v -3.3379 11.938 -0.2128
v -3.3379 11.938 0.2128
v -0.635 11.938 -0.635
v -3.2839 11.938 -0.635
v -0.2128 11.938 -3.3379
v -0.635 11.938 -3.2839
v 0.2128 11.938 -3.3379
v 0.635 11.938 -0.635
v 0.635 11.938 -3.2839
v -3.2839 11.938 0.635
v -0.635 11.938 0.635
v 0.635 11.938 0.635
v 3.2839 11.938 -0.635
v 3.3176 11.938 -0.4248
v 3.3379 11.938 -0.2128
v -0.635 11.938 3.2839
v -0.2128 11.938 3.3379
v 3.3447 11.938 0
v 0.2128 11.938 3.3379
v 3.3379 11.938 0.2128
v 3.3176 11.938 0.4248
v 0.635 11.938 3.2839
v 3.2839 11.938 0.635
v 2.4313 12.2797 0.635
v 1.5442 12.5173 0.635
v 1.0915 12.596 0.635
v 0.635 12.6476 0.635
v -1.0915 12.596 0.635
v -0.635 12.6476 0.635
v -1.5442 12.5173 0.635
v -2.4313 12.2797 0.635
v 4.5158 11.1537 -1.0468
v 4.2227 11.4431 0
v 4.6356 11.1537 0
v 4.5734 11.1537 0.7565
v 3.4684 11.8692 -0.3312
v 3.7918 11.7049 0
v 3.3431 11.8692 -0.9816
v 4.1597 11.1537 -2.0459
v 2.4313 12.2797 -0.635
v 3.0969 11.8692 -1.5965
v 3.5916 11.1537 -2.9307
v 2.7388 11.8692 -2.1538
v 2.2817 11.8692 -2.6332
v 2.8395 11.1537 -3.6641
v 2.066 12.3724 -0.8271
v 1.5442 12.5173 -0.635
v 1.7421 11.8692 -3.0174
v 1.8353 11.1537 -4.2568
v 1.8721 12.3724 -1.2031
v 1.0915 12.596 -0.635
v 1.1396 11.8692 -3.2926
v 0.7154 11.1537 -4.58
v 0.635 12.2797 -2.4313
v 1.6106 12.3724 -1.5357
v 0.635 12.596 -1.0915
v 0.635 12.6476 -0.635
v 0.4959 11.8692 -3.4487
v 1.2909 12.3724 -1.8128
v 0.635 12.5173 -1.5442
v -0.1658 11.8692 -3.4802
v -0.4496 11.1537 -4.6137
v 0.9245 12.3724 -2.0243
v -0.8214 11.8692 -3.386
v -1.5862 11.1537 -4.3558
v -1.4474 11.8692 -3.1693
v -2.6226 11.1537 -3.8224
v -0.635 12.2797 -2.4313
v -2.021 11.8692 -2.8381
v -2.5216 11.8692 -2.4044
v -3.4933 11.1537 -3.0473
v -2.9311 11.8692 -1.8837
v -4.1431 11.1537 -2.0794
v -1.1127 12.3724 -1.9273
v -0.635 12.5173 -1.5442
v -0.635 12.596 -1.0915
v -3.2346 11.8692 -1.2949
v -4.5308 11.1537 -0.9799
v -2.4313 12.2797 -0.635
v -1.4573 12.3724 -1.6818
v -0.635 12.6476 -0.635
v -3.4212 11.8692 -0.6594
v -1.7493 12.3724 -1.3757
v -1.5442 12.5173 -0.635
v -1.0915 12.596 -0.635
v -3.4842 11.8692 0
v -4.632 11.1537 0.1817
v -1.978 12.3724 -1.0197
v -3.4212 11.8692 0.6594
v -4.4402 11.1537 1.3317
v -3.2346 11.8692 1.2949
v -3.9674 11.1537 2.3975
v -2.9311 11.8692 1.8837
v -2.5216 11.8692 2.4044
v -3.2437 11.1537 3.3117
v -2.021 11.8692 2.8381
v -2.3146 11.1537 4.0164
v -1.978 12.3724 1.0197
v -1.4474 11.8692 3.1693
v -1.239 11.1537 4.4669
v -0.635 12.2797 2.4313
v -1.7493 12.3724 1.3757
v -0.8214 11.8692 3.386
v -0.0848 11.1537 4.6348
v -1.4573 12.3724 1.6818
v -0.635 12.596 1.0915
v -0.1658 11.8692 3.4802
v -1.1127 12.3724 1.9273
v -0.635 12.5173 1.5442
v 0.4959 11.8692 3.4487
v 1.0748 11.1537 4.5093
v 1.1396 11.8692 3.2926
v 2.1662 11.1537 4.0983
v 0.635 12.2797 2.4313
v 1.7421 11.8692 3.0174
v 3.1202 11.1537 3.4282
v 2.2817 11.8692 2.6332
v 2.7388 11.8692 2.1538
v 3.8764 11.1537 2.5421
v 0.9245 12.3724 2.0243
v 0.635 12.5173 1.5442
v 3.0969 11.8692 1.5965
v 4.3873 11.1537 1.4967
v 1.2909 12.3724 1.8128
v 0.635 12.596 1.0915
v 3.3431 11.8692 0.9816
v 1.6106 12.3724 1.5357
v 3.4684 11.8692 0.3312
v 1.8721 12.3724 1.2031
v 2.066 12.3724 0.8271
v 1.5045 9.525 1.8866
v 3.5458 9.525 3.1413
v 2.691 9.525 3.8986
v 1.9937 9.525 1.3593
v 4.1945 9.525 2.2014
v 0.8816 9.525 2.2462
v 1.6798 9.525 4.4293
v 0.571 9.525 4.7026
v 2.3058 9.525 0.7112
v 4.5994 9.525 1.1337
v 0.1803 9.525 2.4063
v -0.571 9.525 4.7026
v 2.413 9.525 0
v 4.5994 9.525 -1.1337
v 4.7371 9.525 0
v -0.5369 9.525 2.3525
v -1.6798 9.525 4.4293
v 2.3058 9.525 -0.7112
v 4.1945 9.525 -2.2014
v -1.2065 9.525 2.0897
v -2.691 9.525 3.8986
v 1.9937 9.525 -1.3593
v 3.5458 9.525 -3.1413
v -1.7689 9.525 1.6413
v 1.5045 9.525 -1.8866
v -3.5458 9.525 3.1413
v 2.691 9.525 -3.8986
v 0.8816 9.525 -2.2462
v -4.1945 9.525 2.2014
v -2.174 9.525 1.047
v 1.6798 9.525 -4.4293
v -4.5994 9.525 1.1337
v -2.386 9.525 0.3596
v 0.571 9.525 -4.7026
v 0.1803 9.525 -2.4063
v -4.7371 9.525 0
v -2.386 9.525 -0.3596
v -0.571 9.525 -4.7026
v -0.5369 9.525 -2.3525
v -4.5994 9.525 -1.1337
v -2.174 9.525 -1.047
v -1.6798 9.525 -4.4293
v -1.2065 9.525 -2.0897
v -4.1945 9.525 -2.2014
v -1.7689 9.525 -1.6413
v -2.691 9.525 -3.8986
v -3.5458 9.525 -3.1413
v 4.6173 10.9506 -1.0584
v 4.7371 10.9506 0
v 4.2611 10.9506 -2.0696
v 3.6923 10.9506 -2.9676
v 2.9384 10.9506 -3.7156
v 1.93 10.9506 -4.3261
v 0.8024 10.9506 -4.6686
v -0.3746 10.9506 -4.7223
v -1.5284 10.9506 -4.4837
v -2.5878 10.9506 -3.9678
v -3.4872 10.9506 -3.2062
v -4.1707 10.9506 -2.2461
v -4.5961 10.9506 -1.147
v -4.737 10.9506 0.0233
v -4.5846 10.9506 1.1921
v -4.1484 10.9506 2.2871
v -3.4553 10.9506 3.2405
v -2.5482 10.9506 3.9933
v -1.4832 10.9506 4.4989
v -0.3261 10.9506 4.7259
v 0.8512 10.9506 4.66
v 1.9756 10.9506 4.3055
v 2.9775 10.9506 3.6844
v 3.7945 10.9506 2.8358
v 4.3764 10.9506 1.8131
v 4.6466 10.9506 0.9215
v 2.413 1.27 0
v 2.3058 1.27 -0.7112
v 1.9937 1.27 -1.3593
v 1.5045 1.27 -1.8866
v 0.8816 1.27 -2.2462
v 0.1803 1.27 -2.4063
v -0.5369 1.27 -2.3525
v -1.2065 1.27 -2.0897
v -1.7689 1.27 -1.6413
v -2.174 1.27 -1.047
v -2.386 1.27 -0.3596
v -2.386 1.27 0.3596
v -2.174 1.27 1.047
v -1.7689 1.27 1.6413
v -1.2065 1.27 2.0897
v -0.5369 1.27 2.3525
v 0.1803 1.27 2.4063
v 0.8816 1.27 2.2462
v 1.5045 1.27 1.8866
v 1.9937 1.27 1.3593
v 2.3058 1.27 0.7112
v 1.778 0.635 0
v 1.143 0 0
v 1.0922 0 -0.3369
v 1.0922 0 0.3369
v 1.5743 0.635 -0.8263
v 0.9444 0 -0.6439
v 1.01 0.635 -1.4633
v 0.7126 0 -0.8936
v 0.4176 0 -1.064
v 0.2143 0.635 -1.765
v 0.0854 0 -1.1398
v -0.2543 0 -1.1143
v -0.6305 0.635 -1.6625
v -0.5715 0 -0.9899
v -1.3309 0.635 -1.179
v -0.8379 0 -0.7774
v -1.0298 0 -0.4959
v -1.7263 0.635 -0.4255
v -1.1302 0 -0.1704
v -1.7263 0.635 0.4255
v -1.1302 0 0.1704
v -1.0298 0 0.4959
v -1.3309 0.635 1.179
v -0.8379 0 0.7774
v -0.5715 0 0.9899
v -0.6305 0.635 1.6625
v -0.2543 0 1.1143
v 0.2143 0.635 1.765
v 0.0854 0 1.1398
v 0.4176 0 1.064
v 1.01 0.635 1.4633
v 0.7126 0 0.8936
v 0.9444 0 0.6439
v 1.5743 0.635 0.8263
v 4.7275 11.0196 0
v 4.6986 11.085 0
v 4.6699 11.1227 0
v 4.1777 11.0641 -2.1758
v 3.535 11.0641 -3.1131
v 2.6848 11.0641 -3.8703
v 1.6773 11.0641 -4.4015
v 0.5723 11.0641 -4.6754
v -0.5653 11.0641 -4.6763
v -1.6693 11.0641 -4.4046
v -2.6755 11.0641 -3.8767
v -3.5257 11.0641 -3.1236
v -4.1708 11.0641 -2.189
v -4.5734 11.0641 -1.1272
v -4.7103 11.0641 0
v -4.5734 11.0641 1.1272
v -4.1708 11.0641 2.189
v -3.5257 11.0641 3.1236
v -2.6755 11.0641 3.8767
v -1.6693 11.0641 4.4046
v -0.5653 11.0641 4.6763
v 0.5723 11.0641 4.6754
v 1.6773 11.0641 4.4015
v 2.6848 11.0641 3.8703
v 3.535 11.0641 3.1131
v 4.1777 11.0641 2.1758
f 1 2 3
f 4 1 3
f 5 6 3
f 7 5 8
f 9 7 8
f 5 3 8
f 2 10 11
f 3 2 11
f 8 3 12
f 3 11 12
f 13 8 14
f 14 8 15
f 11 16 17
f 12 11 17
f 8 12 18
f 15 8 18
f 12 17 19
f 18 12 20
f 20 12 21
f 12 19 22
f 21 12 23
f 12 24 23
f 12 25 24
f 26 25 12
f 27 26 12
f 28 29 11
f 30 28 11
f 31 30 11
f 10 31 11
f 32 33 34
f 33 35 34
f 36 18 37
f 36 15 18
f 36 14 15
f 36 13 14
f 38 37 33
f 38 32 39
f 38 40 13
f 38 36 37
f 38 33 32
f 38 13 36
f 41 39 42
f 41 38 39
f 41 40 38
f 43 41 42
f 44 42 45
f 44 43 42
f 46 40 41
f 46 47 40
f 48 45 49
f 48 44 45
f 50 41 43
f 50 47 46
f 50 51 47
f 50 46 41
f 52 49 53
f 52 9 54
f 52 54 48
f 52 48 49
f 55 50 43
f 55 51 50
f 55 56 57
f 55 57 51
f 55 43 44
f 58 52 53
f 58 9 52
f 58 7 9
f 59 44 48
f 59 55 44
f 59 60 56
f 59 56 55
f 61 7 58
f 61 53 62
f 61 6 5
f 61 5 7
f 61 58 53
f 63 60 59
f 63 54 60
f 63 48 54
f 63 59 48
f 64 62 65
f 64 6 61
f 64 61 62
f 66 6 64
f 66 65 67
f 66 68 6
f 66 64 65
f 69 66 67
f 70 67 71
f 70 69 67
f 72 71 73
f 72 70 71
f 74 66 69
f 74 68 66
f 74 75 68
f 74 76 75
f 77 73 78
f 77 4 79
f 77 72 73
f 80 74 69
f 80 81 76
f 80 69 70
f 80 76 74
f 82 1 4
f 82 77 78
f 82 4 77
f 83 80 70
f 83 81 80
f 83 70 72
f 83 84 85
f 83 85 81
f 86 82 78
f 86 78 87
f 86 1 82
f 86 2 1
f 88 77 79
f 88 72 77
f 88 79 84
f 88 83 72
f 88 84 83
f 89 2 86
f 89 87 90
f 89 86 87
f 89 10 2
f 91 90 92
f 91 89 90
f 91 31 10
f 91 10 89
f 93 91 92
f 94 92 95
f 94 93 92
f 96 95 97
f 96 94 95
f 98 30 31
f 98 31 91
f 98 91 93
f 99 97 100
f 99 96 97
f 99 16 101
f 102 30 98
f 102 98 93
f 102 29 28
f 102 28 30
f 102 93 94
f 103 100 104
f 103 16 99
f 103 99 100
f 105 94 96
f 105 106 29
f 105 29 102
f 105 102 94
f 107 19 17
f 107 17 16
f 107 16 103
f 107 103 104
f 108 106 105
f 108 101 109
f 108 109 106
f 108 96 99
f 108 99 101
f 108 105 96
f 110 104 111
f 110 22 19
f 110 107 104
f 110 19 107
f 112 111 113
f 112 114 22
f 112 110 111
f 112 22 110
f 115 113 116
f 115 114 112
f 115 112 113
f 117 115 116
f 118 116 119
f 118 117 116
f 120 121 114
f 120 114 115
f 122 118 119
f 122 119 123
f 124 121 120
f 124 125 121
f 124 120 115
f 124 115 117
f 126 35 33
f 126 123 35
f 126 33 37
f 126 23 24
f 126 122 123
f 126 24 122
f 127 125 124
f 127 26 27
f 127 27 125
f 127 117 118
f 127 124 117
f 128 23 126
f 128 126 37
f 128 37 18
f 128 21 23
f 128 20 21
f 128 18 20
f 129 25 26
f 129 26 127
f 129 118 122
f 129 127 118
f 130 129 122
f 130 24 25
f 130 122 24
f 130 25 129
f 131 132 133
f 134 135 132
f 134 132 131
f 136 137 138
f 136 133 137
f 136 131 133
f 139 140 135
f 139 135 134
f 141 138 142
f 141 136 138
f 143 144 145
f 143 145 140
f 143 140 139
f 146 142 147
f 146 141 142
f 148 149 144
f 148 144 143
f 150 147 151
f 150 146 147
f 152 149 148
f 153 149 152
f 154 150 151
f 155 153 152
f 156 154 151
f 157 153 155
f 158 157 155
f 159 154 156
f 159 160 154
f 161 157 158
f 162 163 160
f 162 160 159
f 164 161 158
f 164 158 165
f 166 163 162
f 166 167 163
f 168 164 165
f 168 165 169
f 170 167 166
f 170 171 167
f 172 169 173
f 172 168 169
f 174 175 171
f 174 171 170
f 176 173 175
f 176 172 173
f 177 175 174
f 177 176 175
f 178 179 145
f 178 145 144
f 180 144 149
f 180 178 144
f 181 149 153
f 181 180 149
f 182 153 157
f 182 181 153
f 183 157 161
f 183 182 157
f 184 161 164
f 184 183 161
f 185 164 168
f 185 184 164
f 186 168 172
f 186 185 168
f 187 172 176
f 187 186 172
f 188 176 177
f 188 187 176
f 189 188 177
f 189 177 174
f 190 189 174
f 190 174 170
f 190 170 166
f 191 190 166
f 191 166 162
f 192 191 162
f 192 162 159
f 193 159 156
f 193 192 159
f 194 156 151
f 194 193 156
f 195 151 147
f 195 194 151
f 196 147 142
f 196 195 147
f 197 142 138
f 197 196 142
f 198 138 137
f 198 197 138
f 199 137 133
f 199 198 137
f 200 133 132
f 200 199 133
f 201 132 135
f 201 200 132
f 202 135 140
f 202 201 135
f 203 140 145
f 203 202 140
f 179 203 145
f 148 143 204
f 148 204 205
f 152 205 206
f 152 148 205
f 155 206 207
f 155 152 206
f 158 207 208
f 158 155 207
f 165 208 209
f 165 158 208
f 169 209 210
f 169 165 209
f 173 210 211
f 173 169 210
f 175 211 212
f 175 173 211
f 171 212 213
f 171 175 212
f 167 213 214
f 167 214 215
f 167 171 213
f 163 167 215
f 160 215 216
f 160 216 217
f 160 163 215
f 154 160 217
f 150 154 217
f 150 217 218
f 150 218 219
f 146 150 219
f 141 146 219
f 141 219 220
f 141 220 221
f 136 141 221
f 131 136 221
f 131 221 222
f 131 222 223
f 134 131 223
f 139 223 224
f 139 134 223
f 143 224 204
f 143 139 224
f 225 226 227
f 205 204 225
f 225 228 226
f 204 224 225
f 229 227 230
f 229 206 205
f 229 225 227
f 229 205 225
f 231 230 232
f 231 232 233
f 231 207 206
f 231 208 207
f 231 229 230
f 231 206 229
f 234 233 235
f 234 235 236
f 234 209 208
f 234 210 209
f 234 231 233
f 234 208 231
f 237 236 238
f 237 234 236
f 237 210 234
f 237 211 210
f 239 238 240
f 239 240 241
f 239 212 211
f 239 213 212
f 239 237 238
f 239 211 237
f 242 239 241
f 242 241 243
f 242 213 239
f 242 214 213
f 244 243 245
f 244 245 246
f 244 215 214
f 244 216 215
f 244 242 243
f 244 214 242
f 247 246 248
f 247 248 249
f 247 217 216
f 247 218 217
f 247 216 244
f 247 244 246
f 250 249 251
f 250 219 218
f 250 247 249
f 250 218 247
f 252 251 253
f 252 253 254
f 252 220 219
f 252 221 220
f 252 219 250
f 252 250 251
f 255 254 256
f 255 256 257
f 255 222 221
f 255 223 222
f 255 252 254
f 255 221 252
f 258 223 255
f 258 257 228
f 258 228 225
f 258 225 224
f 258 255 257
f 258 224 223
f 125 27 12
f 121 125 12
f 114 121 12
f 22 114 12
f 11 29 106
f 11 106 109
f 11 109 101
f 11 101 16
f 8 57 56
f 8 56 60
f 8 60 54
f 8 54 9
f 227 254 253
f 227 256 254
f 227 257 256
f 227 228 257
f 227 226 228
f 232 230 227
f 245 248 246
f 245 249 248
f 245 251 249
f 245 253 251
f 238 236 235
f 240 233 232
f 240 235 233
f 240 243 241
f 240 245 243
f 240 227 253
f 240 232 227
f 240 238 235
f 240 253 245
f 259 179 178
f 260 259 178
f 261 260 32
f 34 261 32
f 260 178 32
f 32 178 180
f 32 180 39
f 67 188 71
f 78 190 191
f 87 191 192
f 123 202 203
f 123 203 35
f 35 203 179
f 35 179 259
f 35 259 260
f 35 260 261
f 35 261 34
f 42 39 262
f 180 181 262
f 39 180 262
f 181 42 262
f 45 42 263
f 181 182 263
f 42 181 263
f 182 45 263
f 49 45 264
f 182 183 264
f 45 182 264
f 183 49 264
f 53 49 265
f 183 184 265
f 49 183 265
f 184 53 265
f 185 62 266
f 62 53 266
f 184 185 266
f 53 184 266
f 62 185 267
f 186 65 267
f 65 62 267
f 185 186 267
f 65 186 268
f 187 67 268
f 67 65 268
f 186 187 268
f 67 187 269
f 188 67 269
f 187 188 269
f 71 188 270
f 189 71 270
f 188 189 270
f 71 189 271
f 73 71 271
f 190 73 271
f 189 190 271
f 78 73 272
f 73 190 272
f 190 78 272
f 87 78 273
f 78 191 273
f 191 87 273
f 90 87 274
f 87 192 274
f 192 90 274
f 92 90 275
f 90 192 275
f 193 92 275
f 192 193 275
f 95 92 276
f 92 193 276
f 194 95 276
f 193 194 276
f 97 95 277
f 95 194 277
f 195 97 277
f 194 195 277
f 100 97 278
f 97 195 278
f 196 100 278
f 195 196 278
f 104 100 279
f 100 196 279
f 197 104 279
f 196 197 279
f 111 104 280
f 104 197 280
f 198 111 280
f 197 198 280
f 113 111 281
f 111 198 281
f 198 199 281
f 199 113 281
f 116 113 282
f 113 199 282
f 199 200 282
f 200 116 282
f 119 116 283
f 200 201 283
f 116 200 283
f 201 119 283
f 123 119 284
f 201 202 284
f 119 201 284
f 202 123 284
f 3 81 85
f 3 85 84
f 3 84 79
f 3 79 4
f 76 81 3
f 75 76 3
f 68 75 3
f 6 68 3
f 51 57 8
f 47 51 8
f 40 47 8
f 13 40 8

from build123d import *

# Parameters (mm, degrees)
CUT_EXTRUDE1_DEPTH = 0.635
CIRPATTERN1_COUNT  = 4
CHAMFER1_SIZE      = 1.27
FILLET1_R          = 0.254


with BuildPart() as part:
    # Sketch1 → Revolve1 (revolve)
    with BuildSketch(Plane.XY):
        with BuildLine():
            Line((0, 0), (2.413, 0))
            Line((2.413, 0), (2.413, 9.525))
            Line((2.413, 9.525), (4.7371, 9.525))
            Line((4.7371, 9.525), (4.7371, 11.076185676))
            ThreePointArc((4.7371, 11.076185676), (2.503841517, 12.282774321), (0, 12.7))
            Line((0, 12.7), (0, 0))
        make_face()
    revolve(axis=Axis((0, 0, 0), (0, 1, 0)))

    # Sketch2 → Cut-Extrude1 (cut, symmetric)
    with BuildSketch(Plane.XY):
        with BuildLine():
            Line((0, 12.7), (0, 11.938))
            Line((0, 11.938), (3.344708418, 11.938))
            ThreePointArc((3.344708418, 11.938), (1.71520541, 12.507090255), (0, 12.7))
        make_face()
    cut_extrude1 = extrude(amount=CUT_EXTRUDE1_DEPTH, both=True, mode=Mode.SUBTRACT)

    # CirPattern1: Cut-Extrude1 ×4 about axis
    cirpattern1_axis = Axis((0, 0, 0), (0, 1, 0))
    for i in range(1, CIRPATTERN1_COUNT):
        add(cut_extrude1.rotate(cirpattern1_axis, i * 360 / CIRPATTERN1_COUNT), mode=Mode.SUBTRACT)

    # Chamfer1
    chamfer1_edges = [part.edges().sort_by_distance(p)[0] for p in [
        (-2.413, 0, 0),
    ]]
    chamfer(chamfer1_edges, length=CHAMFER1_SIZE)

    # Fillet1
    fillet1_edges = [part.edges().sort_by_distance(p)[0] for p in [
        (-4.7371, 11.076185676, 0),
    ]]
    fillet(fillet1_edges, radius=FILLET1_R)


solid = part.part
